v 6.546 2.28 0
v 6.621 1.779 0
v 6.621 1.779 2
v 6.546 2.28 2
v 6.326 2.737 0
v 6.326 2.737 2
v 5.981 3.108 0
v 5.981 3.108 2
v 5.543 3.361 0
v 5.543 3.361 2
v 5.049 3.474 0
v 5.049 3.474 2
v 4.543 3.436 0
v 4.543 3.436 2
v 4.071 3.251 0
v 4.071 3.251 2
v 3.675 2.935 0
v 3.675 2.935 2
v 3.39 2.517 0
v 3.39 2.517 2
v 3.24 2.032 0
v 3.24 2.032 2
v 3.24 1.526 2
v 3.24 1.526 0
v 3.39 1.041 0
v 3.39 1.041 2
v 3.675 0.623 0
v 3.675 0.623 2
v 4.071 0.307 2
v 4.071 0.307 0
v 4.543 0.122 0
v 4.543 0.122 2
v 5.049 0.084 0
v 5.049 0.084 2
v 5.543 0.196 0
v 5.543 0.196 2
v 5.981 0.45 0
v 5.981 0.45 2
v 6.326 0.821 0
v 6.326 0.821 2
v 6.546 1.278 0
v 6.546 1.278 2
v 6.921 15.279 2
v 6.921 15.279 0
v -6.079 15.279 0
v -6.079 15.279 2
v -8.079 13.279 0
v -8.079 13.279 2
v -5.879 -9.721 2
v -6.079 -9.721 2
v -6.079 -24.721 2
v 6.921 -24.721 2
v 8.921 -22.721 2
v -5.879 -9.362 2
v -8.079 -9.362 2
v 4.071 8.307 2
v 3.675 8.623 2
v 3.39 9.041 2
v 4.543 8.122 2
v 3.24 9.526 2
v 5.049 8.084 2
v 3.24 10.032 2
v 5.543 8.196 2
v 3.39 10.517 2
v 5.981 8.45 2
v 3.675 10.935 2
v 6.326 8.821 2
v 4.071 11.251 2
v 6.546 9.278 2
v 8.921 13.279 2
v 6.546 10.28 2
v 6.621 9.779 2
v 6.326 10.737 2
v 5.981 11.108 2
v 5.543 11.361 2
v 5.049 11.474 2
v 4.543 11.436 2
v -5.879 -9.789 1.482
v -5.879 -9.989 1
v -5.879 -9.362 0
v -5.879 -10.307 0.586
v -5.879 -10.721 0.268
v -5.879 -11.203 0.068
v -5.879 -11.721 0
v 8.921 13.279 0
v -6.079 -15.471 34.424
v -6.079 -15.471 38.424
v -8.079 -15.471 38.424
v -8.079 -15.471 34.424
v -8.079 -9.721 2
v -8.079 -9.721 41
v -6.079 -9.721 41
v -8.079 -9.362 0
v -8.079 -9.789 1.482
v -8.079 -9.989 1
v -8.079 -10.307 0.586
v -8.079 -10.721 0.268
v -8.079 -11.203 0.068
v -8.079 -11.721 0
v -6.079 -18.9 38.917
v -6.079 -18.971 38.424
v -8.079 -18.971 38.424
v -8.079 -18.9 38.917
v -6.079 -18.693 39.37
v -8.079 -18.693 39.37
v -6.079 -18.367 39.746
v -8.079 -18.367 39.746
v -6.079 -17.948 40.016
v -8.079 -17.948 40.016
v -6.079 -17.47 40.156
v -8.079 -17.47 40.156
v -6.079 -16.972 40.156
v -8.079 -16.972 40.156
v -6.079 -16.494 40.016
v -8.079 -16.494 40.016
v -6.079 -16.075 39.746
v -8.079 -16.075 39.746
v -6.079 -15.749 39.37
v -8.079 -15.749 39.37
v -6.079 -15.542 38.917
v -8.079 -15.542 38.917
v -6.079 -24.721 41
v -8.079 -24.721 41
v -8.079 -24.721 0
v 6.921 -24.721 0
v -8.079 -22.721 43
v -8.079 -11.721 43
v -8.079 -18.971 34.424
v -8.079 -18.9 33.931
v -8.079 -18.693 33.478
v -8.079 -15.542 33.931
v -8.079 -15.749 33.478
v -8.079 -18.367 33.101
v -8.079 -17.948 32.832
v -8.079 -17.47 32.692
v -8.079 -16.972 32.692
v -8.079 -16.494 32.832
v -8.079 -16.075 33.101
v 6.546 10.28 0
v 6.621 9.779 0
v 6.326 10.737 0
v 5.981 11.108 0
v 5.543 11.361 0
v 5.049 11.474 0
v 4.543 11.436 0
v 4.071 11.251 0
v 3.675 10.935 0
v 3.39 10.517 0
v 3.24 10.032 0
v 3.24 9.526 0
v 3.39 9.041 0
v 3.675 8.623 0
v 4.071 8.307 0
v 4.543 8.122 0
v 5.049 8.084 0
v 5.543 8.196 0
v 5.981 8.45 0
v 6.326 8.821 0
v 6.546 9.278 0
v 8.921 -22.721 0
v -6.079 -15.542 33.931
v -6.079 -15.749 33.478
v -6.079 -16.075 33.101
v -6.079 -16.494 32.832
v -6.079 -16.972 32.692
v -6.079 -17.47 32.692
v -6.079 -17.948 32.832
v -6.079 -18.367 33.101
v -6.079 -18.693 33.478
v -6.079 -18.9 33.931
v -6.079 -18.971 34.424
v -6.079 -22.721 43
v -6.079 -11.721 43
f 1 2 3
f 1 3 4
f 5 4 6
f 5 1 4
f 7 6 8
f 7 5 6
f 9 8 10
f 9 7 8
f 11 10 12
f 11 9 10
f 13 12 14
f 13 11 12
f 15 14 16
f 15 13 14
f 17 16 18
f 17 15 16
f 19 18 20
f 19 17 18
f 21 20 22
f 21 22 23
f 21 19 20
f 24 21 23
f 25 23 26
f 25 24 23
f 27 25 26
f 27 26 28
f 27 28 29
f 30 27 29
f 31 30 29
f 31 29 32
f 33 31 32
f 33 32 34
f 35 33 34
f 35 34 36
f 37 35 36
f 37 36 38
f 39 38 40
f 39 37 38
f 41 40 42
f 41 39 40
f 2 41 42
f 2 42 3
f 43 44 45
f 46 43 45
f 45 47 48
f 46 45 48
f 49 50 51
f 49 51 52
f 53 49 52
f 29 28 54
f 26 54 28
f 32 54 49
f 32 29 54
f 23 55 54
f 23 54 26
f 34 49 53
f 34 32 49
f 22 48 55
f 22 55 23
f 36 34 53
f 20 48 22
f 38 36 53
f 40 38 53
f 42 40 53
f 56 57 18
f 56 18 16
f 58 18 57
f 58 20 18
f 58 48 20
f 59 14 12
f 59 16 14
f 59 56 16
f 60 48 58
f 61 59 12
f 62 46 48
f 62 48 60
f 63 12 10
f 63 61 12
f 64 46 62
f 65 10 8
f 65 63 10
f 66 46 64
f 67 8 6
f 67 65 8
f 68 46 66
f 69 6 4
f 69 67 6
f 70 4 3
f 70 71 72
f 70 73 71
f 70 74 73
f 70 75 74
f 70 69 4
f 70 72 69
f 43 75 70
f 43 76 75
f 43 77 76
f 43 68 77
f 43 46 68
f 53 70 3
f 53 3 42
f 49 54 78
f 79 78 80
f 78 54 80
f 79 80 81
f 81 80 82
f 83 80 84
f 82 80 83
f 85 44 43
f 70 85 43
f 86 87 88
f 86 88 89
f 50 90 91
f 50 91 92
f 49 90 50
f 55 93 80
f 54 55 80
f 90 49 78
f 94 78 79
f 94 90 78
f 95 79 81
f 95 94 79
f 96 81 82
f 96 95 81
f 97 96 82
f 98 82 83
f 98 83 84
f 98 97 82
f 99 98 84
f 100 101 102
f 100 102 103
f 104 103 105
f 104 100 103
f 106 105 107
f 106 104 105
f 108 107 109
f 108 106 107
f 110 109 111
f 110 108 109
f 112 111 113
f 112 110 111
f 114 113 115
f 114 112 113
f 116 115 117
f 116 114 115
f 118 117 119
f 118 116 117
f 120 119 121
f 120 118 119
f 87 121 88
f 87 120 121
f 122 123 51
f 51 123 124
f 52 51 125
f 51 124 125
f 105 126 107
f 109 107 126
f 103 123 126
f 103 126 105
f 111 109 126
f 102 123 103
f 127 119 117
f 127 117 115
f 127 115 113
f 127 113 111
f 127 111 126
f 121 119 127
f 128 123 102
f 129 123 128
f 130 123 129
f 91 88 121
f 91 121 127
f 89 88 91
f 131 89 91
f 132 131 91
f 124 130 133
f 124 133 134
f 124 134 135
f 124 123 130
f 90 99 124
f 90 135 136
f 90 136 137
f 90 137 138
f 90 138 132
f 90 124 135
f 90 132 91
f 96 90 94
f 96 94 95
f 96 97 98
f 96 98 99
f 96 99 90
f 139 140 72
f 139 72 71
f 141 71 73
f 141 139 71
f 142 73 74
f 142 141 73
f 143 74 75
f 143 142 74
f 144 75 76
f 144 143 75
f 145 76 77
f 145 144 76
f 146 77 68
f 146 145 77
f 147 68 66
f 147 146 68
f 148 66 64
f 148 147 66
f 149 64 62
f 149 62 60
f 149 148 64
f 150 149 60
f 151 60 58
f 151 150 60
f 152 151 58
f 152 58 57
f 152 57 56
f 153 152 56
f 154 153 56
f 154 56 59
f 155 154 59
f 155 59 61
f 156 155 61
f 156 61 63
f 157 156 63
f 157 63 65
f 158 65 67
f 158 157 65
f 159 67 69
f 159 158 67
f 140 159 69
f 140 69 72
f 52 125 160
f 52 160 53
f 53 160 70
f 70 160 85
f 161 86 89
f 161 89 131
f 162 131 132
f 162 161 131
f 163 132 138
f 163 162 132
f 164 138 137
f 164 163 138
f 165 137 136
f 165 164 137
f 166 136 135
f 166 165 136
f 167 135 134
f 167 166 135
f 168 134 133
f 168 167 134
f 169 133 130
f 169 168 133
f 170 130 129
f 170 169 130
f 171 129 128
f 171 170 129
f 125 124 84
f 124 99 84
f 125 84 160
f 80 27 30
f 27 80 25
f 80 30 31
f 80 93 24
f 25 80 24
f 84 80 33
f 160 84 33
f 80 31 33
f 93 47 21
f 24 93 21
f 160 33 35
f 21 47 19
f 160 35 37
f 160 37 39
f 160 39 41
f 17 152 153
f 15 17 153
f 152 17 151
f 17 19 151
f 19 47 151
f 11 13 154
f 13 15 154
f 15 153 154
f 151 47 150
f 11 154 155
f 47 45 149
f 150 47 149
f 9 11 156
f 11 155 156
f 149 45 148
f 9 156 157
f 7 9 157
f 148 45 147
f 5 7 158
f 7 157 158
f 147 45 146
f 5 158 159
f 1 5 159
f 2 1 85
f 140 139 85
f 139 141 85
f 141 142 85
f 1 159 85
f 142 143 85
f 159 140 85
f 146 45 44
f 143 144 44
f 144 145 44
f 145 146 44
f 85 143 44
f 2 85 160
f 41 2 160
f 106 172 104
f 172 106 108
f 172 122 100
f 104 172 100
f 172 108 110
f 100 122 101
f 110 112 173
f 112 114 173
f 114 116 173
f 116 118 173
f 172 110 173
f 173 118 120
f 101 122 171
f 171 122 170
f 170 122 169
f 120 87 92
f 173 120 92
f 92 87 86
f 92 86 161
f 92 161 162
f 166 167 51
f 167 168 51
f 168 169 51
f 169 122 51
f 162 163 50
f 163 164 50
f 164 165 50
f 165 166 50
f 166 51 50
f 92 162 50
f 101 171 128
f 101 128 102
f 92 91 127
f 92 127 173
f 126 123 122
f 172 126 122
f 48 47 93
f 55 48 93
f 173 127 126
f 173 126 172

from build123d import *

# Parameters (mm, degrees)
SKETCH1_R           = 1.7
BOSS_EXTRUDE1_DEPTH = 2
SKETCH2_W           = 2
SKETCH2_H           = 15
BOSS_EXTRUDE2_DEPTH = 41
CUT_EXTRUDE1_DEPTH  = 52.818254684
FILLET1_R           = 2
CHAMFER1_SIZE       = 2


with BuildPart() as part:
    # Sketch1 → Boss-Extrude1 (new body)
    with BuildSketch(Plane.XY):
        Polygon((-8.078512397, -9.72107438), (-8.078512397, -24.72107438), (8.921487603, -24.72107438), (8.921487603, 15.27892562), (-8.078512397, 15.27892562), (-8.078512397, -9.36189554), (-5.878512397, -9.36189554), (-5.878512397, -9.72107438), align=None)
        with Locations((4.921487603, 9.77892562)):
            Circle(SKETCH1_R, mode=Mode.SUBTRACT)
        with Locations((4.921487603, 1.77892562)):
            Circle(SKETCH1_R, mode=Mode.SUBTRACT)
    extrude(amount=BOSS_EXTRUDE1_DEPTH)

    # Sketch2 → Boss-Extrude2 (add)
    with BuildSketch(Plane.XY.offset(2)):
        with Locations((-7.078512397, -17.22107438)):
            Rectangle(SKETCH2_W, SKETCH2_H)
    extrude(amount=BOSS_EXTRUDE2_DEPTH)

    # Sketch3 → Cut-Extrude1 (cut, through all)
    with BuildSketch(Plane(origin=(-6.078512397, 0, 0), x_dir=(0, 0, -1), z_dir=(1, 0, 0))):
        with BuildLine():
            Line((-38.423728751, -15.47107438), (-34.423728751, -15.47107438))
            ThreePointArc((-34.423728751, -15.47107438), (-32.673728751, -17.22107438), (-34.423728751, -18.97107438))
            Line((-34.423728751, -18.97107438), (-38.423728751, -18.97107438))
            ThreePointArc((-38.423728751, -18.97107438), (-40.173728751, -17.22107438), (-38.423728751, -15.47107438))
        make_face()
    extrude(amount=-CUT_EXTRUDE1_DEPTH, mode=Mode.SUBTRACT)

    # Fillet1
    fillet1_edges = [part.edges().sort_by_distance(p)[0] for p in [
        (-6.978512397, -9.72107438, 0),
    ]]
    fillet(fillet1_edges, radius=FILLET1_R - 0.0001)  # a hair under: the kernel refuses the full size

    # Chamfer1
    chamfer1_edges = [part.edges().sort_by_distance(p)[0] for p in [
        (-8.078512397, 15.27892562, 1),
        (8.921487603, 15.27892562, 1),
        (8.921487603, -24.72107438, 1),
        (-7.078512397, -24.72107438, 43),
        (-7.078512397, -9.72107438, 43),
    ]]
    chamfer(chamfer1_edges, length=CHAMFER1_SIZE)


solid = part.part
